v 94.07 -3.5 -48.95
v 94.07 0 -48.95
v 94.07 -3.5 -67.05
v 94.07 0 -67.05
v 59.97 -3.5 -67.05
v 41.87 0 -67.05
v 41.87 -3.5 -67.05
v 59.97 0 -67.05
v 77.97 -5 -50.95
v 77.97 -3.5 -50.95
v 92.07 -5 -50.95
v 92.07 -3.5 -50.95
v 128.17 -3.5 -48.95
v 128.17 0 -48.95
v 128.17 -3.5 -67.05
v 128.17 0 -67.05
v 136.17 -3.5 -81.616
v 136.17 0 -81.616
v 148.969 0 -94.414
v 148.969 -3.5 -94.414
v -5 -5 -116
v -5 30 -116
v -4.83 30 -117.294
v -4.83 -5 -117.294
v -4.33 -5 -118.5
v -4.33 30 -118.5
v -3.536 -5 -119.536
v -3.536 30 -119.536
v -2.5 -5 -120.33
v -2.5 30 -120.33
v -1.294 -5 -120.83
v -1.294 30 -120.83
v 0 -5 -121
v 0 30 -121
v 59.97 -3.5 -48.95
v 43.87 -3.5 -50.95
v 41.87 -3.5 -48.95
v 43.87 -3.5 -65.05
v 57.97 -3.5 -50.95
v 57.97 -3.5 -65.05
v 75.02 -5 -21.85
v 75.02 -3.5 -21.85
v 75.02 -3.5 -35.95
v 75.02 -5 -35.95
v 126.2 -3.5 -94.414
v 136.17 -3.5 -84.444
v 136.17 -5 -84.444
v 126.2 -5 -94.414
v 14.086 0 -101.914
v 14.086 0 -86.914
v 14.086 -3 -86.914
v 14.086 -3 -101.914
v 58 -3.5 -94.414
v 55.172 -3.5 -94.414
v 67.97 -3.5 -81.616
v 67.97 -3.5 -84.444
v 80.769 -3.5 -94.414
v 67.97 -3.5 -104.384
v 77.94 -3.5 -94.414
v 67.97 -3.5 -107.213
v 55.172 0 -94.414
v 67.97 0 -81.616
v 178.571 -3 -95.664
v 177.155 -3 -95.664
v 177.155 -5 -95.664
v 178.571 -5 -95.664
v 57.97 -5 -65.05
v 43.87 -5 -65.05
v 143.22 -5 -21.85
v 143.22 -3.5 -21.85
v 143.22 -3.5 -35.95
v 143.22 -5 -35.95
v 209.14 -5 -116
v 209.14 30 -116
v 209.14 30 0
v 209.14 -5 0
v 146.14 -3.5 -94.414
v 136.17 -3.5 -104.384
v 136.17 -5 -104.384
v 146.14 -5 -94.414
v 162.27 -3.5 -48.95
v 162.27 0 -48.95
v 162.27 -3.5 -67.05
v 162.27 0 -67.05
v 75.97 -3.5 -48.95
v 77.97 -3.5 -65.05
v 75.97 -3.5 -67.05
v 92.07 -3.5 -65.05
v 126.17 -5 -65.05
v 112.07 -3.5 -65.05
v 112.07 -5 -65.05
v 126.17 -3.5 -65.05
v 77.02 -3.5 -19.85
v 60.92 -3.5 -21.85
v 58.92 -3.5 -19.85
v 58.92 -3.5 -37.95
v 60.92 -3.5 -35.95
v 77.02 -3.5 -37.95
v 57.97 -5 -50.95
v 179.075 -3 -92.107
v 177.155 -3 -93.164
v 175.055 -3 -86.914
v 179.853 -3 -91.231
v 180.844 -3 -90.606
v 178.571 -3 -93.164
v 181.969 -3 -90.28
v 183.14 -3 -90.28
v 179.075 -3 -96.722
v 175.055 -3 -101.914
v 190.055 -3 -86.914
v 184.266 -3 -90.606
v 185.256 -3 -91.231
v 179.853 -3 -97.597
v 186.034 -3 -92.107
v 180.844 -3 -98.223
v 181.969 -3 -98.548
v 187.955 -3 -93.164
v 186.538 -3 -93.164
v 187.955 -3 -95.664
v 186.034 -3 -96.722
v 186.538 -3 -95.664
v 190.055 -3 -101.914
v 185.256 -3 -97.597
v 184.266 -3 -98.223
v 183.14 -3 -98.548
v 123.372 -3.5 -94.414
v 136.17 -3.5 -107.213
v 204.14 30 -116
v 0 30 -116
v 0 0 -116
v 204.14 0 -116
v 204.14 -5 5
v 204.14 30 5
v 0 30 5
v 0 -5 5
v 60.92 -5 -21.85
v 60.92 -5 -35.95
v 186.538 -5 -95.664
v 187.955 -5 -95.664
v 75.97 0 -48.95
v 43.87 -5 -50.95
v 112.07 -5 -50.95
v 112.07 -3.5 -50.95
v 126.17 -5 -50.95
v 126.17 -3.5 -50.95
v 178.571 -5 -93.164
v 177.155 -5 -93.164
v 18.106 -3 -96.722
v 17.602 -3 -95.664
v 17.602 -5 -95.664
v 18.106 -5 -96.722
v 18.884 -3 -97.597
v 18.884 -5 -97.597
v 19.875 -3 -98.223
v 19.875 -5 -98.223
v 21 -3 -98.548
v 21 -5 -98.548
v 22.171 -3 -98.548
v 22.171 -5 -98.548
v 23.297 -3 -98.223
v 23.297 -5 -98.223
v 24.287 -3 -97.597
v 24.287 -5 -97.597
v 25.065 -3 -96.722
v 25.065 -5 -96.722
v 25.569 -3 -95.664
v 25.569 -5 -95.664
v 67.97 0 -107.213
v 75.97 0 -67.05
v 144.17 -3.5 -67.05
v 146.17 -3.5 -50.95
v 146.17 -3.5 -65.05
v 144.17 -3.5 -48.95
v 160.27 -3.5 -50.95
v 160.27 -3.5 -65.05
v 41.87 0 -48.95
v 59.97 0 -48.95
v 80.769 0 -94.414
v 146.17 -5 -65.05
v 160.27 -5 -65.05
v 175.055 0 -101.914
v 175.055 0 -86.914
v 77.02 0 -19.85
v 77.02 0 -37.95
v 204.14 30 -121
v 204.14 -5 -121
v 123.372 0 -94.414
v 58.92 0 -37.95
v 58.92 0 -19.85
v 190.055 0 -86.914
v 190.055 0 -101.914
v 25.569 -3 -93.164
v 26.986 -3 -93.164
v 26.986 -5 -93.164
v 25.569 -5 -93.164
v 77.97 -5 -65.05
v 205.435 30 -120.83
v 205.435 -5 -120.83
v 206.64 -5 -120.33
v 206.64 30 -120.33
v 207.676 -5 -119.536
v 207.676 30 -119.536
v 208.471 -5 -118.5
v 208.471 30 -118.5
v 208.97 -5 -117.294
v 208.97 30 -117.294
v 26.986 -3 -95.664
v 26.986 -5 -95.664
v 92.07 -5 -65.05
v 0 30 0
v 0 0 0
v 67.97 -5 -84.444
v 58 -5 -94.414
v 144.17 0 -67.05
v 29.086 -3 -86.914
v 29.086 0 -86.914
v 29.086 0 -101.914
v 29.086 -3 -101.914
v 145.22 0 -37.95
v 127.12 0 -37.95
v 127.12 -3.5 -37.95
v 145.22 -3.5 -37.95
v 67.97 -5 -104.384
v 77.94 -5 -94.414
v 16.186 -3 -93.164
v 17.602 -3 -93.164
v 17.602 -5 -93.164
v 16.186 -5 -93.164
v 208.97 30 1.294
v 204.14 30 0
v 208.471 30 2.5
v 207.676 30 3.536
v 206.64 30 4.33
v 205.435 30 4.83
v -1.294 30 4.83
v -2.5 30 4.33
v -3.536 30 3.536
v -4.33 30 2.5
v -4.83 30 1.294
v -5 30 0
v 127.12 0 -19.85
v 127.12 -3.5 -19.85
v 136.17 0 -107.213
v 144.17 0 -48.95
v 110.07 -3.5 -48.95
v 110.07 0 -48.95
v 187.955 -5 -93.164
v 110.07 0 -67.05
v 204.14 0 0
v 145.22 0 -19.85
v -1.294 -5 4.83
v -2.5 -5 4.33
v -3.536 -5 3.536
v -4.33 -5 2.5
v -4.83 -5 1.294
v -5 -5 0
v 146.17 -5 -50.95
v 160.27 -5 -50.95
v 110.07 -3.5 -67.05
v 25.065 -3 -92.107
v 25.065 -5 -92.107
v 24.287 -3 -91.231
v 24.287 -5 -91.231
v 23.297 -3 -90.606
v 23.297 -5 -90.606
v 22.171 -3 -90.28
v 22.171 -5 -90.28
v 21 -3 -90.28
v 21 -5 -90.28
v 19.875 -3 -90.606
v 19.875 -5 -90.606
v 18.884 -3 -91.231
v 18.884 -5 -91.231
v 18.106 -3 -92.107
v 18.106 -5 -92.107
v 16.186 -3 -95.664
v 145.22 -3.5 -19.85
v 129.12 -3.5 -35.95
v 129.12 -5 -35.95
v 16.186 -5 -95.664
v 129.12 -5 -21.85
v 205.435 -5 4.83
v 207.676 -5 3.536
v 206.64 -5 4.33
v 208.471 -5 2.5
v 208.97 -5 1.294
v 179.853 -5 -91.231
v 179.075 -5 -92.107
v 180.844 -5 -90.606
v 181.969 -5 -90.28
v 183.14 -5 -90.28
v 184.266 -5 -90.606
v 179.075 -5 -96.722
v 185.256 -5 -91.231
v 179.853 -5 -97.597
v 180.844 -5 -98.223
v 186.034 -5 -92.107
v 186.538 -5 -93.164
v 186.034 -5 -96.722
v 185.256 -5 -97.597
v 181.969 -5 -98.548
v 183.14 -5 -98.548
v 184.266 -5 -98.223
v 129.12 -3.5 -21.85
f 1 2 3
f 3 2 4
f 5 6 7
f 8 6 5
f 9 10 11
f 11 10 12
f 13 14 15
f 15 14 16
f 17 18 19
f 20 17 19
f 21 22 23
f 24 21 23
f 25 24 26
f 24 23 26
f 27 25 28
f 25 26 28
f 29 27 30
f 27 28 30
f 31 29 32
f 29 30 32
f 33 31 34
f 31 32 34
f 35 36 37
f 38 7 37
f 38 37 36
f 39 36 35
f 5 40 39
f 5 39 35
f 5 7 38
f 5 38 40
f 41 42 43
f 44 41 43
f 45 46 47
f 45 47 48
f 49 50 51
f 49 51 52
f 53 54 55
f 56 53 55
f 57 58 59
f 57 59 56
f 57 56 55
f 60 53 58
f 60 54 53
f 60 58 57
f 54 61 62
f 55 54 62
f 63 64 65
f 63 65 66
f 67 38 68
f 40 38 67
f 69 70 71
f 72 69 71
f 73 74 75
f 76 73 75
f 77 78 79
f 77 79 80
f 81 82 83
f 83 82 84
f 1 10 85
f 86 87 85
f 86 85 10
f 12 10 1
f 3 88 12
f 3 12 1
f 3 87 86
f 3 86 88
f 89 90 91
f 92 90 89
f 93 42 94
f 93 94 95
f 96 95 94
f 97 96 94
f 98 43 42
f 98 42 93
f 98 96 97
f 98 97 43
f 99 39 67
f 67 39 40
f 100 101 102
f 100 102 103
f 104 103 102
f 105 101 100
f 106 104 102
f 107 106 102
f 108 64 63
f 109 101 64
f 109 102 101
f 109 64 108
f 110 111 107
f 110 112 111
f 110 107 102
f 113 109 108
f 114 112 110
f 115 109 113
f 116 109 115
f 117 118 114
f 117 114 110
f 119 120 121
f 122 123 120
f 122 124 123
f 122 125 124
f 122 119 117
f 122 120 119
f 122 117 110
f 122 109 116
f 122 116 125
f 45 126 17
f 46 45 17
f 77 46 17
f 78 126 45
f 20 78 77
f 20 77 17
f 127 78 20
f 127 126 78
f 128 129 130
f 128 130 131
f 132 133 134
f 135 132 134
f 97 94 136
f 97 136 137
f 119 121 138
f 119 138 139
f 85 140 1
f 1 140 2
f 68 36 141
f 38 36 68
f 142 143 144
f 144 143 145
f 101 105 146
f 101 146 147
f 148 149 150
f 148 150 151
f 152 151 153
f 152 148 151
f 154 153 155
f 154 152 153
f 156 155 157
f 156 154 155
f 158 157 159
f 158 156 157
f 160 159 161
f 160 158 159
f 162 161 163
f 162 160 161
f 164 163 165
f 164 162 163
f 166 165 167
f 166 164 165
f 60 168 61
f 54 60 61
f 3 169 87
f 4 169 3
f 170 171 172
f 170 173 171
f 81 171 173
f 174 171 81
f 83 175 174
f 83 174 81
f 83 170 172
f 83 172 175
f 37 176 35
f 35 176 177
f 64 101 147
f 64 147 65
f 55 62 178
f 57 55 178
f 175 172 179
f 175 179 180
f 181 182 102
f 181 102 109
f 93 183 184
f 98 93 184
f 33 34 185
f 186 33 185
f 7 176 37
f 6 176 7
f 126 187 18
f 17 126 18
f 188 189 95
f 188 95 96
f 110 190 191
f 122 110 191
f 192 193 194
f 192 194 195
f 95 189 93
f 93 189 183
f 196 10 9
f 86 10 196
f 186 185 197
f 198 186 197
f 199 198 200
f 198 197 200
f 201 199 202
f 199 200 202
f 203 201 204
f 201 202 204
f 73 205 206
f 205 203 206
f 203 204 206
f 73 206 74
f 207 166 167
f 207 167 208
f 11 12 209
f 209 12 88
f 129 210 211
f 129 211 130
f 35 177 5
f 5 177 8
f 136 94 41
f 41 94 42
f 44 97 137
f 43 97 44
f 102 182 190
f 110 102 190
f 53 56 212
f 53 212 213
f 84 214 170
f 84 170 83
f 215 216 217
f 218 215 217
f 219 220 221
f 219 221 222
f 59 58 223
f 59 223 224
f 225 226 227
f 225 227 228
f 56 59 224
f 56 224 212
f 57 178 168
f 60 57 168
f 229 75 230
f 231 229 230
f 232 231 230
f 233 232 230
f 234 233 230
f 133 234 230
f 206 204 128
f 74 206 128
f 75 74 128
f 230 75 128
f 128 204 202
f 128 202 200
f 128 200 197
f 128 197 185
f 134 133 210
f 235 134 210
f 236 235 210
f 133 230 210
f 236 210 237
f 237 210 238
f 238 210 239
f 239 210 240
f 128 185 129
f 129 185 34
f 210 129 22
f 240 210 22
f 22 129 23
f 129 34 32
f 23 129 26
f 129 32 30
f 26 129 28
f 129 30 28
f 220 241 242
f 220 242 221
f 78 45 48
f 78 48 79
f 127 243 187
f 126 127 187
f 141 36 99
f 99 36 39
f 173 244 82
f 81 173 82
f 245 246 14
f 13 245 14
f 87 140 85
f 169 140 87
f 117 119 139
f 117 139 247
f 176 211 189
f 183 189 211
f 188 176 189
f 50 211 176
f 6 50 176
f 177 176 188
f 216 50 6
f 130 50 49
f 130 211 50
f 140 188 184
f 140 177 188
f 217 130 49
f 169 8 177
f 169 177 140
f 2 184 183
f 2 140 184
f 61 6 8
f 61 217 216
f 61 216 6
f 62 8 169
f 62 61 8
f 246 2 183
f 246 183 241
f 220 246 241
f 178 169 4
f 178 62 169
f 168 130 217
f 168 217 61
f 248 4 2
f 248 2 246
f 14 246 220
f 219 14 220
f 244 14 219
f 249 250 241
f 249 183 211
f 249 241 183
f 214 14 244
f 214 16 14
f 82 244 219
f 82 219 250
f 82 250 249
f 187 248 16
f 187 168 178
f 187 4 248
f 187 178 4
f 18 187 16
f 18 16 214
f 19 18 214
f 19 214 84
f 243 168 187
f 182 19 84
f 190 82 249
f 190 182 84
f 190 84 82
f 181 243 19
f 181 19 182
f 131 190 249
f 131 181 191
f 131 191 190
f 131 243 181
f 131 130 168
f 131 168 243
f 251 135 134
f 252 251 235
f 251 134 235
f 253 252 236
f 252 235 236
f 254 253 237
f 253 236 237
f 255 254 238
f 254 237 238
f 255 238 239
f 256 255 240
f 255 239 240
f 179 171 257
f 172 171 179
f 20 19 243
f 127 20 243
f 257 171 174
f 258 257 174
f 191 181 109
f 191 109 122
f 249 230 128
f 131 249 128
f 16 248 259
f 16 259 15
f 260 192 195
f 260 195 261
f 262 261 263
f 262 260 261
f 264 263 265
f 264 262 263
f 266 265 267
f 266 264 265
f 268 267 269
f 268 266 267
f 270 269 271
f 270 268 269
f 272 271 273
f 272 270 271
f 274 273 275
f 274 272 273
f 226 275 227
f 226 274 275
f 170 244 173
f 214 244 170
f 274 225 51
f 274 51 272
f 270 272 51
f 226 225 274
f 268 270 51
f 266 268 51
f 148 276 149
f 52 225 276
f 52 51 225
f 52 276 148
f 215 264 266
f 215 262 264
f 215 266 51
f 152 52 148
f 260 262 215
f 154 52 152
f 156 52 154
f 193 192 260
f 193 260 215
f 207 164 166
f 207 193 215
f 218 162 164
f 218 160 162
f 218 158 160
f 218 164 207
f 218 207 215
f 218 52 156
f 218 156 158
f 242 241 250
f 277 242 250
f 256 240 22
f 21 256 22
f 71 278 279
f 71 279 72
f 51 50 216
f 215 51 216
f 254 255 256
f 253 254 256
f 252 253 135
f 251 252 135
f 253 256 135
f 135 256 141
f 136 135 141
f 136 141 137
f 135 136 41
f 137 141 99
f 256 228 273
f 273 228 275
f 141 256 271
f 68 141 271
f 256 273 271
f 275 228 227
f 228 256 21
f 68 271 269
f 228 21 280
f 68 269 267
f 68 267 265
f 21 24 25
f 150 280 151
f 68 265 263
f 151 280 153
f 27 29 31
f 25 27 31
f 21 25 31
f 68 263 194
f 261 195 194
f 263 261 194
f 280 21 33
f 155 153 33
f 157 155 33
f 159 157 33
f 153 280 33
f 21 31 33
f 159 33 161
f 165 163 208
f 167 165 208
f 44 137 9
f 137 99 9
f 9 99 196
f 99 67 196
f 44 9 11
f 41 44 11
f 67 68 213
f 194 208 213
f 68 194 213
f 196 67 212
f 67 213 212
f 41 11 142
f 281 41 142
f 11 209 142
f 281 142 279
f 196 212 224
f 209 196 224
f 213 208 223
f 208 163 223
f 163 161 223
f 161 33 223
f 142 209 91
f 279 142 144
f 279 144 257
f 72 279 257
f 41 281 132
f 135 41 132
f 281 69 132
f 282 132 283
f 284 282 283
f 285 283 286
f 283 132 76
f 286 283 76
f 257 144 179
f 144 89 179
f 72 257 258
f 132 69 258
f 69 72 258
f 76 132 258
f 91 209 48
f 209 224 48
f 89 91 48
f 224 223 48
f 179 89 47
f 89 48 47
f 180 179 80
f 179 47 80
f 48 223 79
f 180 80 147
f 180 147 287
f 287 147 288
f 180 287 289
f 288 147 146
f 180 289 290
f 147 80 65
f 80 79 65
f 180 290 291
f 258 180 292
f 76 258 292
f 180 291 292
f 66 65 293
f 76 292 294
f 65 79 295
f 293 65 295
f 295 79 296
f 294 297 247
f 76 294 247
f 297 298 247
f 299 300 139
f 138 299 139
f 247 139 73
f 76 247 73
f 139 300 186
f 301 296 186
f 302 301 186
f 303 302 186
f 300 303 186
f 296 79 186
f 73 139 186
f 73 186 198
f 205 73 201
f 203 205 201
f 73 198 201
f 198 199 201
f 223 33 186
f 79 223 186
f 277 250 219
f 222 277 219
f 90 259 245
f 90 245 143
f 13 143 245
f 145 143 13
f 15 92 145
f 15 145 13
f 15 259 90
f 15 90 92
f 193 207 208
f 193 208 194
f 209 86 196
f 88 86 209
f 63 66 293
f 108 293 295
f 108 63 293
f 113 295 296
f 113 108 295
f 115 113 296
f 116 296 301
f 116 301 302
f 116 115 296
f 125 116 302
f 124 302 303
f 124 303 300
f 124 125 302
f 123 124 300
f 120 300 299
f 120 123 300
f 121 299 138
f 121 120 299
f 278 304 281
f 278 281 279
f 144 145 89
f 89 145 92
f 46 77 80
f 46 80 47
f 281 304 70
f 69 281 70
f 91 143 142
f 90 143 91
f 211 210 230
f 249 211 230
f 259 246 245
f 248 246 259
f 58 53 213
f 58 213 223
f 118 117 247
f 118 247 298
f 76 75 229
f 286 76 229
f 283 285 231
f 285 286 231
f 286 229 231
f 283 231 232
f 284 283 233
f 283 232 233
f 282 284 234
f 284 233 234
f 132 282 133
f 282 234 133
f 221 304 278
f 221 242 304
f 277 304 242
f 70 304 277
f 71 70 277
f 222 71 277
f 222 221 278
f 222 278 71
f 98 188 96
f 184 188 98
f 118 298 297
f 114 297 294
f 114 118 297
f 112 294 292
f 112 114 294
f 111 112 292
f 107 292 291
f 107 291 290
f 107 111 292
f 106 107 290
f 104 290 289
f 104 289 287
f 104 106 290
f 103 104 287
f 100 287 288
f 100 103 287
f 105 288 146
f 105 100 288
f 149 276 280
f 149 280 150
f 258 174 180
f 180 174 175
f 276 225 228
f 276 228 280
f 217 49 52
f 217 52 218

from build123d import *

# Parameters (mm, degrees)
SKETCH1_W           = 14.1
SKETCH1_H           = 14.1
BOSS_EXTRUDE1_DEPTH = 5
BOSS_EXTRUDE2_START = 30
SKETCH1_3_W         = 204.140411229
SKETCH1_3_H         = 116
SKETCH1_3_W_2       = 14.1
SKETCH1_3_H_2       = 14.1
SKETCH1_3_R         = 4.175
SKETCH1_3_W_3       = 10.8
SKETCH1_3_H_3       = 2.5
BOSS_EXTRUDE2_DEPTH = 30
SKETCH3_W           = 18.1
SKETCH3_H           = 18.1
CUT_EXTRUDE1_DEPTH  = 3.5
SKETCH4_W           = 15
SKETCH4_H           = 15
CUT_EXTRUDE2_DEPTH  = 3


with BuildPart() as part:
    # Sketch1 → Boss-Extrude1 (new body)
    with BuildSketch(Plane(origin=(0, 0, 0), x_dir=(1, 0, 0), z_dir=(0, 1, 0))):
        with BuildLine():
            Line((-5, 116), (-5, 0))
            ThreePointArc((-5, 0), (-3.535533906, -3.535533906), (0, -5))
            Line((0, -5), (204.140411229, -5))
            ThreePointArc((204.140411229, -5), (207.675945135, -3.535533906), (209.140411229, 0))
            Line((209.140411229, 0), (209.140411229, 116))
            ThreePointArc((209.140411229, 116), (207.675945135, 119.535533906), (204.140411229, 121))
            Line((204.140411229, 121), (0, 121))
            ThreePointArc((0, 121), (-3.535533906, 119.535533906), (-5, 116))
        make_face()
        with Locations((50.920205615, 58)):
            Rectangle(SKETCH1_W, SKETCH1_H, mode=Mode.SUBTRACT)
        with Locations((85.020205615, 58)):
            Rectangle(SKETCH1_W, SKETCH1_H, mode=Mode.SUBTRACT)
        with Locations((67.970205615, 28.9)):
            Rectangle(SKETCH1_W, SKETCH1_H, mode=Mode.SUBTRACT)
        with Locations((136.170205615, 28.9)):
            Rectangle(SKETCH1_W, SKETCH1_H, mode=Mode.SUBTRACT)
        with Locations((119.120205615, 58)):
            Rectangle(SKETCH1_W, SKETCH1_H, mode=Mode.SUBTRACT)
        with Locations((153.220205615, 58)):
            Rectangle(SKETCH1_W, SKETCH1_H, mode=Mode.SUBTRACT)
        Polygon((77.940411229, 94.414213562), (67.970205615, 84.444007948), (58, 94.414213562), (67.970205615, 104.384419177), align=None, mode=Mode.SUBTRACT)
        Polygon((126.2, 94.414213562), (136.170205615, 104.384419177), (146.140411229, 94.414213562), (136.170205615, 84.444007948), align=None, mode=Mode.SUBTRACT)
        with BuildLine():
            Line((16.185786438, 93.164213562), (16.185786438, 95.664213562))
            Line((16.185786438, 95.664213562), (17.60230492, 95.664213562))
            ThreePointArc((17.60230492, 95.664213562), (21.585786438, 98.589213562), (25.569267955, 95.664213562))
            Line((25.569267955, 95.664213562), (26.985786438, 95.664213562))
            Line((26.985786438, 95.664213562), (26.985786438, 93.164213562))
            Line((26.985786438, 93.164213562), (25.569267955, 93.164213562))
            ThreePointArc((25.569267955, 93.164213562), (21.585786438, 90.239213562), (17.60230492, 93.164213562))
            Line((17.60230492, 93.164213562), (16.185786438, 93.164213562))
        make_face(mode=Mode.SUBTRACT)
        with BuildLine():
            Line((177.154624792, 93.164213562), (177.154624792, 95.664213562))
            Line((177.154624792, 95.664213562), (178.571143274, 95.664213562))
            ThreePointArc((178.571143274, 95.664213562), (182.554624792, 98.589213562), (186.538106309, 95.664213562))
            Line((186.538106309, 95.664213562), (187.954624792, 95.664213562))
            Line((187.954624792, 95.664213562), (187.954624792, 93.164213562))
            Line((187.954624792, 93.164213562), (186.538106309, 93.164213562))
            ThreePointArc((186.538106309, 93.164213562), (182.554624792, 90.239213562), (178.571143274, 93.164213562))
            Line((178.571143274, 93.164213562), (177.154624792, 93.164213562))
        make_face(mode=Mode.SUBTRACT)
    extrude(amount=-BOSS_EXTRUDE1_DEPTH)

    # Sketch1<3> → Boss-Extrude2 (add)
    # profile 1 of 13: a face of its own
    with BuildSketch(Plane(origin=(0, 0, 0), x_dir=(1, 0, 0), z_dir=(0, 1, 0)).offset(BOSS_EXTRUDE2_START)):
        with BuildLine():
            Line((-5, 0), (-5, 116))
            ThreePointArc((-5, 116), (-3.535533906, 119.535533906), (0, 121))
            Line((0, 121), (204.140411229, 121))
            ThreePointArc((204.140411229, 121), (207.675945135, 119.535533906), (209.140411229, 116))
            Line((209.140411229, 116), (209.140411229, 0))
            ThreePointArc((209.140411229, 0), (207.675945135, -3.535533906), (204.140411229, -5))
            Line((204.140411229, -5), (0, -5))
            ThreePointArc((0, -5), (-3.535533906, -3.535533906), (-5, 0))
        make_face()
        with Locations((102.070205615, 58)):
            Rectangle(SKETCH1_3_W, SKETCH1_3_H, mode=Mode.SUBTRACT)
    # profile 2 of 13: a face of its own
    with BuildSketch(Plane(origin=(0, 0, 0), x_dir=(1, 0, 0), z_dir=(0, 1, 0)).offset(BOSS_EXTRUDE2_START)):
        Polygon((136.170205615, 84.444007948), (126.2, 94.414213562), (136.170205615, 104.384419177), (146.140411229, 94.414213562), align=None)
    # profile 3 of 13: a face of its own
    with BuildSketch(Plane(origin=(0, 0, 0), x_dir=(1, 0, 0), z_dir=(0, 1, 0)).offset(BOSS_EXTRUDE2_START)):
        Polygon((67.970205615, 104.384419177), (58, 94.414213562), (67.970205615, 84.444007948), (77.940411229, 94.414213562), align=None)
    # profile 4 of 13: a face of its own
    with BuildSketch(Plane(origin=(0, 0, 0), x_dir=(1, 0, 0), z_dir=(0, 1, 0)).offset(BOSS_EXTRUDE2_START)):
        with Locations((153.220205615, 58)):
            Rectangle(SKETCH1_3_W_2, SKETCH1_3_H_2)
    # profile 5 of 13: a face of its own
    with BuildSketch(Plane(origin=(0, 0, 0), x_dir=(1, 0, 0), z_dir=(0, 1, 0)).offset(BOSS_EXTRUDE2_START)):
        with Locations((119.120205615, 58)):
            Rectangle(SKETCH1_3_W_2, SKETCH1_3_H_2)
    # profile 6 of 13: a face of its own
    with BuildSketch(Plane(origin=(0, 0, 0), x_dir=(1, 0, 0), z_dir=(0, 1, 0)).offset(BOSS_EXTRUDE2_START)):
        with Locations((136.170205615, 28.9)):
            Rectangle(SKETCH1_3_W_2, SKETCH1_3_H_2)
    # profile 7 of 13: a face of its own
    with BuildSketch(Plane(origin=(0, 0, 0), x_dir=(1, 0, 0), z_dir=(0, 1, 0)).offset(BOSS_EXTRUDE2_START)):
        with Locations((67.970205615, 28.9)):
            Rectangle(SKETCH1_3_W_2, SKETCH1_3_H_2)
    # profile 8 of 13: a face of its own
    with BuildSketch(Plane(origin=(0, 0, 0), x_dir=(1, 0, 0), z_dir=(0, 1, 0)).offset(BOSS_EXTRUDE2_START)):
        with Locations((85.020205615, 58)):
            Rectangle(SKETCH1_3_W_2, SKETCH1_3_H_2)
    # profile 9 of 13: a face of its own
    with BuildSketch(Plane(origin=(0, 0, 0), x_dir=(1, 0, 0), z_dir=(0, 1, 0)).offset(BOSS_EXTRUDE2_START)):
        with Locations((50.920205615, 58)):
            Rectangle(SKETCH1_3_W_2, SKETCH1_3_H_2)
    # profile 10 of 13: a face of its own
    with BuildSketch(Plane(origin=(0, 0, 0), x_dir=(1, 0, 0), z_dir=(0, 1, 0)).offset(BOSS_EXTRUDE2_START)):
        with Locations((182.554624792, 94.414213562)):
            Circle(SKETCH1_3_R)
    # profile 11 of 13: a face of its own
    with BuildSketch(Plane(origin=(0, 0, 0), x_dir=(1, 0, 0), z_dir=(0, 1, 0)).offset(BOSS_EXTRUDE2_START)):
        with Locations((21.585786438, 94.414213562)):
            Circle(SKETCH1_3_R)
    # profile 12 of 13: a face of its own
    with BuildSketch(Plane(origin=(0, 0, 0), x_dir=(1, 0, 0), z_dir=(0, 1, 0)).offset(BOSS_EXTRUDE2_START)):
        with Locations((21.585786438, 94.414213562)):
            Rectangle(SKETCH1_3_W_3, SKETCH1_3_H_3)
    # profile 13 of 13: a face of its own
    with BuildSketch(Plane(origin=(0, 0, 0), x_dir=(1, 0, 0), z_dir=(0, 1, 0)).offset(BOSS_EXTRUDE2_START)):
        with Locations((182.554624792, 94.414213562)):
            Rectangle(SKETCH1_3_W_3, SKETCH1_3_H_3)
    extrude(amount=-BOSS_EXTRUDE2_DEPTH)


with BuildPart() as boss_extrude2_kept_piece:
    # of the separate pieces the step leaves, the one the design keeps (boss_extrude2_pieces_kept)
    add(part.part.solids().sort_by_distance((204.140411229, -5, -121))[0])

    # Sketch3 → Cut-Extrude1 (cut)
    with BuildSketch(Plane(origin=(0, 0, 0), x_dir=(1, 0, 0), z_dir=(0, 1, 0))):
        with Locations((50.920205615, 58)):
            Rectangle(SKETCH3_W, SKETCH3_H)
        Polygon((67.970205615, 107.212846302), (55.171572875, 94.414213562), (67.970205615, 81.615580823), (80.768838354, 94.414213562), align=None)
        with Locations((67.970205615, 28.9)):
            Rectangle(SKETCH3_W, SKETCH3_H)
        with Locations((85.020205615, 58)):
            Rectangle(SKETCH3_W, SKETCH3_H)
        with Locations((119.120205615, 58)):
            Rectangle(SKETCH3_W, SKETCH3_H)
        with Locations((153.220205615, 58)):
            Rectangle(SKETCH3_W, SKETCH3_H)
        Polygon((123.371572875, 94.414213562), (136.170205615, 81.615580823), (148.968838354, 94.414213562), (136.170205615, 107.212846302), align=None)
        with Locations((136.170205615, 28.9)):
            Rectangle(SKETCH3_W, SKETCH3_H)
    extrude(amount=-CUT_EXTRUDE1_DEPTH, mode=Mode.SUBTRACT)

    # Sketch4 → Cut-Extrude2 (cut)
    with BuildSketch(Plane(origin=(0, 0, 0), x_dir=(1, 0, 0), z_dir=(0, 1, 0))):
        with Locations((21.585786438, 94.414213562)):
            Rectangle(SKETCH4_W, SKETCH4_H)
        with Locations((182.554624792, 94.414213562)):
            Rectangle(SKETCH4_W, SKETCH4_H)
    extrude(amount=-CUT_EXTRUDE2_DEPTH, mode=Mode.SUBTRACT)


solid = boss_extrude2_kept_piece.part
